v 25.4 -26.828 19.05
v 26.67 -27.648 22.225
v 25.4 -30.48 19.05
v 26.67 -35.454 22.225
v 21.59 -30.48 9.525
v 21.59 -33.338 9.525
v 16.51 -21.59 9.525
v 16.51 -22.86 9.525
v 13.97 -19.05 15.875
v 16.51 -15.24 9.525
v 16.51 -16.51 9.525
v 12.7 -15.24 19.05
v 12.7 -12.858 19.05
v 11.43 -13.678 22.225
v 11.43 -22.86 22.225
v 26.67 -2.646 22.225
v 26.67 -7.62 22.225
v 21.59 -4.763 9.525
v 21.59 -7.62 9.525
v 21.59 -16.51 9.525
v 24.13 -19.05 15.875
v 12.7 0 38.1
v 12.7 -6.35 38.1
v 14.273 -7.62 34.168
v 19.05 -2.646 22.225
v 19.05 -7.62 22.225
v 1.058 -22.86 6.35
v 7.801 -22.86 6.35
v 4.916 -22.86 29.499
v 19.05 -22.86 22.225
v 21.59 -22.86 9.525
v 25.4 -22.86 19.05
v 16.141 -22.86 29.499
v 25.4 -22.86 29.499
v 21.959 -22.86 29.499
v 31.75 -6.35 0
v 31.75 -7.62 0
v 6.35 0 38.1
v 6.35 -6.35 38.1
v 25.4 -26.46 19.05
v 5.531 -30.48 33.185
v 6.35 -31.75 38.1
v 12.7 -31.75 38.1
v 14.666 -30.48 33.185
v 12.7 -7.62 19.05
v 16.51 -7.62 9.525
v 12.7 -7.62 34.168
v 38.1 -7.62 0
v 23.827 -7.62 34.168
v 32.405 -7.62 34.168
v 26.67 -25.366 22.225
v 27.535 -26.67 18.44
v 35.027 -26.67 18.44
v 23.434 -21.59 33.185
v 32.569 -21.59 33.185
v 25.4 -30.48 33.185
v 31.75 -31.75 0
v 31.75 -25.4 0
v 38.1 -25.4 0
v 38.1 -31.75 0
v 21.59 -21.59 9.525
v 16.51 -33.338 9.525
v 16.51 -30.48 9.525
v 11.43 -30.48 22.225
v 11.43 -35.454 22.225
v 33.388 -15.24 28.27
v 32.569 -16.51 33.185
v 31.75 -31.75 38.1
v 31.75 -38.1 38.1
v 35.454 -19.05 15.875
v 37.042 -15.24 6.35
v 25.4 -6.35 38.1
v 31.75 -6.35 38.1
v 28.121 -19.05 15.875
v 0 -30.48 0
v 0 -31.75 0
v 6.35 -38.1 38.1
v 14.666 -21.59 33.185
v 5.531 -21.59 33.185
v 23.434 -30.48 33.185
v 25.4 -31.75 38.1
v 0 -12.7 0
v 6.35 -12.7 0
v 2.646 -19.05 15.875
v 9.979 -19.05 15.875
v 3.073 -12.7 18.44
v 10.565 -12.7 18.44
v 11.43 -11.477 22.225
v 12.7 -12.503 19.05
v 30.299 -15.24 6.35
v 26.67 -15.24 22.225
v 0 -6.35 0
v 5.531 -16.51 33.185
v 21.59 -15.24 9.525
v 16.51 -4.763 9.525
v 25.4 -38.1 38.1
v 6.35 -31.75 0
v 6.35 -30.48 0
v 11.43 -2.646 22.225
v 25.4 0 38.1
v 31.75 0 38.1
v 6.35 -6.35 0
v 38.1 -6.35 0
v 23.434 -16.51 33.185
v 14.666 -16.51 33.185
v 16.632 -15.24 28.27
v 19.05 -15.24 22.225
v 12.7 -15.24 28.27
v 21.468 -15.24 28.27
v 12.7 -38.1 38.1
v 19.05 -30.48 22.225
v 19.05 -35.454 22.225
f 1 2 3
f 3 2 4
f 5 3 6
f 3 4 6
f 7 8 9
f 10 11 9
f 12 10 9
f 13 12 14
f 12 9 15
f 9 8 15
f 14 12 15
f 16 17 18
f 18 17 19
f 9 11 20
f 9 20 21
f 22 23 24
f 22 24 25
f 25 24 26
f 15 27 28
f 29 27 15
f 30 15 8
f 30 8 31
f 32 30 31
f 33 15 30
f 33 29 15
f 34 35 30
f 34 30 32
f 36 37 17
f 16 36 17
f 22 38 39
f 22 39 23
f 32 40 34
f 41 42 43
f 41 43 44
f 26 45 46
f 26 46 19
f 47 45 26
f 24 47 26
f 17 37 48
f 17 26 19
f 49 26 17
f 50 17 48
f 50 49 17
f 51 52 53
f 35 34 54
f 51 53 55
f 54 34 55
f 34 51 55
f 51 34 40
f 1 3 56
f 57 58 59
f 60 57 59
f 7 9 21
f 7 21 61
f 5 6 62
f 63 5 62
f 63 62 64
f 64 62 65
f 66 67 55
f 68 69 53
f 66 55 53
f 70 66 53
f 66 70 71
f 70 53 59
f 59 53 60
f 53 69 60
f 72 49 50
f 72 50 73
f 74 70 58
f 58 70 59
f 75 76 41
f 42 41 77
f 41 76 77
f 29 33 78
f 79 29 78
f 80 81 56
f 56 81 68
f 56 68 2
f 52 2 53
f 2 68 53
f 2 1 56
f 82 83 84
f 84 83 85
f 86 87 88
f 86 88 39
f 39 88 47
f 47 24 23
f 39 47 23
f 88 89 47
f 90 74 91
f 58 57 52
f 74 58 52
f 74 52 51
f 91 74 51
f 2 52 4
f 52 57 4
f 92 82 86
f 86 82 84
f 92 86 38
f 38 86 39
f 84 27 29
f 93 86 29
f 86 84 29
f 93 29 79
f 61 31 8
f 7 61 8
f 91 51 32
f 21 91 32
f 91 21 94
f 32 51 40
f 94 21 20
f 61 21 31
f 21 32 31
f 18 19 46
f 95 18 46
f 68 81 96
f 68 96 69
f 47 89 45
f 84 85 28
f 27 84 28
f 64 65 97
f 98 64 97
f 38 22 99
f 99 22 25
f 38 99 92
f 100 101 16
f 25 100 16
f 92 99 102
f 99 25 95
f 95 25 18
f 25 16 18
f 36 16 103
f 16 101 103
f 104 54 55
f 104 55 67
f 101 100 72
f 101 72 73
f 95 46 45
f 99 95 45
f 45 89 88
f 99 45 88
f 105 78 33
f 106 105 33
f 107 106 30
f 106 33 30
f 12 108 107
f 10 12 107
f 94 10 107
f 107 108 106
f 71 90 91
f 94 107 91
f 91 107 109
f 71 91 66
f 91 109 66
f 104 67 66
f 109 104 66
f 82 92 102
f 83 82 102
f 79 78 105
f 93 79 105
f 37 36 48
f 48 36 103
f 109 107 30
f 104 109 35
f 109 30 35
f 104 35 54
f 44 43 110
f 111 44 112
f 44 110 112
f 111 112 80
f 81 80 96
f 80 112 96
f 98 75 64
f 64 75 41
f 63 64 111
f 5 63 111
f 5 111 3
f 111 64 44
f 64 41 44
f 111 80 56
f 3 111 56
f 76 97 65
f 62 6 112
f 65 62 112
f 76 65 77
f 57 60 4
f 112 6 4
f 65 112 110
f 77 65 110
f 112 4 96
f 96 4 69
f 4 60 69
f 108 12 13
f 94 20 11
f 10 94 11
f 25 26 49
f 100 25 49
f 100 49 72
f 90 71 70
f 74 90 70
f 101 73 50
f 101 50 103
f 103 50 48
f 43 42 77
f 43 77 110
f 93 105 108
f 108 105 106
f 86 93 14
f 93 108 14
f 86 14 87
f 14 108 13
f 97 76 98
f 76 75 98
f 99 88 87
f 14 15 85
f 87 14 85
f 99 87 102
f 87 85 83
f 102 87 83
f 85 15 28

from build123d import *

# Parameters (mm, degrees)
F0_W      = 38.1
F0_H      = 38.1
F1_DEPTH  = 38.1
F6_DEPTH  = 38.1
F8_DEPTH  = 38.1
F9_W      = 25.4
F9_H      = 7.62
F10_DEPTH = 38.1


with BuildPart() as f1:
    # F0 (on Front) → F1 (new body)
    with BuildSketch(Plane.XZ):
        with Locations((19.05, 19.05)):
            Rectangle(F0_W, F0_H)
    extrude(amount=F1_DEPTH)

    # F5 (on offset) → F6 (cut)
    with BuildSketch(Plane.YZ.offset(38.1)):
        Polygon((-38.1, 0), (-31.75, 0), (-38.1, 38.1), align=None)
        Polygon((-12.7, 18.439805), (-6.35, 38.1), (-31.75, 38.1), (-26.67, 18.439805), (-21.59, 33.184951), (-16.51, 33.184951), align=None)
        Polygon((-25.4, 0), (-12.7, 0), (-19.05, 15.875), align=None)
        Polygon((-6.35, 0), (0, 0), (0, 38.1), align=None)
    extrude(amount=-F6_DEPTH, mode=Mode.SUBTRACT)

    # F7 (on offset) → F8 (cut)
    with BuildSketch(Plane.XZ.offset(38.1)):
        Polygon((0, 38.1), (0, 0), (6.35, 38.1), align=None)
        Polygon((11.43, 22.225), (6.35, 0), (31.75, 0), (26.67, 22.225), (21.59, 9.525), (16.51, 9.525), align=None)
        Polygon((25.4, 38.1), (12.7, 38.1), (19.05, 22.225), align=None)
        Polygon((31.75, 38.1), (38.1, 0), (38.1, 38.1), align=None)
    extrude(amount=-F8_DEPTH, mode=Mode.SUBTRACT)

    # F9 (on offset) → F10 (cut)
    with BuildSketch(Plane.XY.offset(38.1)):
        with Locations((25.4, -11.43)):
            Rectangle(F9_W, F9_H)
        with Locations((12.7, -26.67)):
            Rectangle(F9_W, F9_H)
    extrude(amount=-F10_DEPTH, mode=Mode.SUBTRACT)


solid = f1.part
